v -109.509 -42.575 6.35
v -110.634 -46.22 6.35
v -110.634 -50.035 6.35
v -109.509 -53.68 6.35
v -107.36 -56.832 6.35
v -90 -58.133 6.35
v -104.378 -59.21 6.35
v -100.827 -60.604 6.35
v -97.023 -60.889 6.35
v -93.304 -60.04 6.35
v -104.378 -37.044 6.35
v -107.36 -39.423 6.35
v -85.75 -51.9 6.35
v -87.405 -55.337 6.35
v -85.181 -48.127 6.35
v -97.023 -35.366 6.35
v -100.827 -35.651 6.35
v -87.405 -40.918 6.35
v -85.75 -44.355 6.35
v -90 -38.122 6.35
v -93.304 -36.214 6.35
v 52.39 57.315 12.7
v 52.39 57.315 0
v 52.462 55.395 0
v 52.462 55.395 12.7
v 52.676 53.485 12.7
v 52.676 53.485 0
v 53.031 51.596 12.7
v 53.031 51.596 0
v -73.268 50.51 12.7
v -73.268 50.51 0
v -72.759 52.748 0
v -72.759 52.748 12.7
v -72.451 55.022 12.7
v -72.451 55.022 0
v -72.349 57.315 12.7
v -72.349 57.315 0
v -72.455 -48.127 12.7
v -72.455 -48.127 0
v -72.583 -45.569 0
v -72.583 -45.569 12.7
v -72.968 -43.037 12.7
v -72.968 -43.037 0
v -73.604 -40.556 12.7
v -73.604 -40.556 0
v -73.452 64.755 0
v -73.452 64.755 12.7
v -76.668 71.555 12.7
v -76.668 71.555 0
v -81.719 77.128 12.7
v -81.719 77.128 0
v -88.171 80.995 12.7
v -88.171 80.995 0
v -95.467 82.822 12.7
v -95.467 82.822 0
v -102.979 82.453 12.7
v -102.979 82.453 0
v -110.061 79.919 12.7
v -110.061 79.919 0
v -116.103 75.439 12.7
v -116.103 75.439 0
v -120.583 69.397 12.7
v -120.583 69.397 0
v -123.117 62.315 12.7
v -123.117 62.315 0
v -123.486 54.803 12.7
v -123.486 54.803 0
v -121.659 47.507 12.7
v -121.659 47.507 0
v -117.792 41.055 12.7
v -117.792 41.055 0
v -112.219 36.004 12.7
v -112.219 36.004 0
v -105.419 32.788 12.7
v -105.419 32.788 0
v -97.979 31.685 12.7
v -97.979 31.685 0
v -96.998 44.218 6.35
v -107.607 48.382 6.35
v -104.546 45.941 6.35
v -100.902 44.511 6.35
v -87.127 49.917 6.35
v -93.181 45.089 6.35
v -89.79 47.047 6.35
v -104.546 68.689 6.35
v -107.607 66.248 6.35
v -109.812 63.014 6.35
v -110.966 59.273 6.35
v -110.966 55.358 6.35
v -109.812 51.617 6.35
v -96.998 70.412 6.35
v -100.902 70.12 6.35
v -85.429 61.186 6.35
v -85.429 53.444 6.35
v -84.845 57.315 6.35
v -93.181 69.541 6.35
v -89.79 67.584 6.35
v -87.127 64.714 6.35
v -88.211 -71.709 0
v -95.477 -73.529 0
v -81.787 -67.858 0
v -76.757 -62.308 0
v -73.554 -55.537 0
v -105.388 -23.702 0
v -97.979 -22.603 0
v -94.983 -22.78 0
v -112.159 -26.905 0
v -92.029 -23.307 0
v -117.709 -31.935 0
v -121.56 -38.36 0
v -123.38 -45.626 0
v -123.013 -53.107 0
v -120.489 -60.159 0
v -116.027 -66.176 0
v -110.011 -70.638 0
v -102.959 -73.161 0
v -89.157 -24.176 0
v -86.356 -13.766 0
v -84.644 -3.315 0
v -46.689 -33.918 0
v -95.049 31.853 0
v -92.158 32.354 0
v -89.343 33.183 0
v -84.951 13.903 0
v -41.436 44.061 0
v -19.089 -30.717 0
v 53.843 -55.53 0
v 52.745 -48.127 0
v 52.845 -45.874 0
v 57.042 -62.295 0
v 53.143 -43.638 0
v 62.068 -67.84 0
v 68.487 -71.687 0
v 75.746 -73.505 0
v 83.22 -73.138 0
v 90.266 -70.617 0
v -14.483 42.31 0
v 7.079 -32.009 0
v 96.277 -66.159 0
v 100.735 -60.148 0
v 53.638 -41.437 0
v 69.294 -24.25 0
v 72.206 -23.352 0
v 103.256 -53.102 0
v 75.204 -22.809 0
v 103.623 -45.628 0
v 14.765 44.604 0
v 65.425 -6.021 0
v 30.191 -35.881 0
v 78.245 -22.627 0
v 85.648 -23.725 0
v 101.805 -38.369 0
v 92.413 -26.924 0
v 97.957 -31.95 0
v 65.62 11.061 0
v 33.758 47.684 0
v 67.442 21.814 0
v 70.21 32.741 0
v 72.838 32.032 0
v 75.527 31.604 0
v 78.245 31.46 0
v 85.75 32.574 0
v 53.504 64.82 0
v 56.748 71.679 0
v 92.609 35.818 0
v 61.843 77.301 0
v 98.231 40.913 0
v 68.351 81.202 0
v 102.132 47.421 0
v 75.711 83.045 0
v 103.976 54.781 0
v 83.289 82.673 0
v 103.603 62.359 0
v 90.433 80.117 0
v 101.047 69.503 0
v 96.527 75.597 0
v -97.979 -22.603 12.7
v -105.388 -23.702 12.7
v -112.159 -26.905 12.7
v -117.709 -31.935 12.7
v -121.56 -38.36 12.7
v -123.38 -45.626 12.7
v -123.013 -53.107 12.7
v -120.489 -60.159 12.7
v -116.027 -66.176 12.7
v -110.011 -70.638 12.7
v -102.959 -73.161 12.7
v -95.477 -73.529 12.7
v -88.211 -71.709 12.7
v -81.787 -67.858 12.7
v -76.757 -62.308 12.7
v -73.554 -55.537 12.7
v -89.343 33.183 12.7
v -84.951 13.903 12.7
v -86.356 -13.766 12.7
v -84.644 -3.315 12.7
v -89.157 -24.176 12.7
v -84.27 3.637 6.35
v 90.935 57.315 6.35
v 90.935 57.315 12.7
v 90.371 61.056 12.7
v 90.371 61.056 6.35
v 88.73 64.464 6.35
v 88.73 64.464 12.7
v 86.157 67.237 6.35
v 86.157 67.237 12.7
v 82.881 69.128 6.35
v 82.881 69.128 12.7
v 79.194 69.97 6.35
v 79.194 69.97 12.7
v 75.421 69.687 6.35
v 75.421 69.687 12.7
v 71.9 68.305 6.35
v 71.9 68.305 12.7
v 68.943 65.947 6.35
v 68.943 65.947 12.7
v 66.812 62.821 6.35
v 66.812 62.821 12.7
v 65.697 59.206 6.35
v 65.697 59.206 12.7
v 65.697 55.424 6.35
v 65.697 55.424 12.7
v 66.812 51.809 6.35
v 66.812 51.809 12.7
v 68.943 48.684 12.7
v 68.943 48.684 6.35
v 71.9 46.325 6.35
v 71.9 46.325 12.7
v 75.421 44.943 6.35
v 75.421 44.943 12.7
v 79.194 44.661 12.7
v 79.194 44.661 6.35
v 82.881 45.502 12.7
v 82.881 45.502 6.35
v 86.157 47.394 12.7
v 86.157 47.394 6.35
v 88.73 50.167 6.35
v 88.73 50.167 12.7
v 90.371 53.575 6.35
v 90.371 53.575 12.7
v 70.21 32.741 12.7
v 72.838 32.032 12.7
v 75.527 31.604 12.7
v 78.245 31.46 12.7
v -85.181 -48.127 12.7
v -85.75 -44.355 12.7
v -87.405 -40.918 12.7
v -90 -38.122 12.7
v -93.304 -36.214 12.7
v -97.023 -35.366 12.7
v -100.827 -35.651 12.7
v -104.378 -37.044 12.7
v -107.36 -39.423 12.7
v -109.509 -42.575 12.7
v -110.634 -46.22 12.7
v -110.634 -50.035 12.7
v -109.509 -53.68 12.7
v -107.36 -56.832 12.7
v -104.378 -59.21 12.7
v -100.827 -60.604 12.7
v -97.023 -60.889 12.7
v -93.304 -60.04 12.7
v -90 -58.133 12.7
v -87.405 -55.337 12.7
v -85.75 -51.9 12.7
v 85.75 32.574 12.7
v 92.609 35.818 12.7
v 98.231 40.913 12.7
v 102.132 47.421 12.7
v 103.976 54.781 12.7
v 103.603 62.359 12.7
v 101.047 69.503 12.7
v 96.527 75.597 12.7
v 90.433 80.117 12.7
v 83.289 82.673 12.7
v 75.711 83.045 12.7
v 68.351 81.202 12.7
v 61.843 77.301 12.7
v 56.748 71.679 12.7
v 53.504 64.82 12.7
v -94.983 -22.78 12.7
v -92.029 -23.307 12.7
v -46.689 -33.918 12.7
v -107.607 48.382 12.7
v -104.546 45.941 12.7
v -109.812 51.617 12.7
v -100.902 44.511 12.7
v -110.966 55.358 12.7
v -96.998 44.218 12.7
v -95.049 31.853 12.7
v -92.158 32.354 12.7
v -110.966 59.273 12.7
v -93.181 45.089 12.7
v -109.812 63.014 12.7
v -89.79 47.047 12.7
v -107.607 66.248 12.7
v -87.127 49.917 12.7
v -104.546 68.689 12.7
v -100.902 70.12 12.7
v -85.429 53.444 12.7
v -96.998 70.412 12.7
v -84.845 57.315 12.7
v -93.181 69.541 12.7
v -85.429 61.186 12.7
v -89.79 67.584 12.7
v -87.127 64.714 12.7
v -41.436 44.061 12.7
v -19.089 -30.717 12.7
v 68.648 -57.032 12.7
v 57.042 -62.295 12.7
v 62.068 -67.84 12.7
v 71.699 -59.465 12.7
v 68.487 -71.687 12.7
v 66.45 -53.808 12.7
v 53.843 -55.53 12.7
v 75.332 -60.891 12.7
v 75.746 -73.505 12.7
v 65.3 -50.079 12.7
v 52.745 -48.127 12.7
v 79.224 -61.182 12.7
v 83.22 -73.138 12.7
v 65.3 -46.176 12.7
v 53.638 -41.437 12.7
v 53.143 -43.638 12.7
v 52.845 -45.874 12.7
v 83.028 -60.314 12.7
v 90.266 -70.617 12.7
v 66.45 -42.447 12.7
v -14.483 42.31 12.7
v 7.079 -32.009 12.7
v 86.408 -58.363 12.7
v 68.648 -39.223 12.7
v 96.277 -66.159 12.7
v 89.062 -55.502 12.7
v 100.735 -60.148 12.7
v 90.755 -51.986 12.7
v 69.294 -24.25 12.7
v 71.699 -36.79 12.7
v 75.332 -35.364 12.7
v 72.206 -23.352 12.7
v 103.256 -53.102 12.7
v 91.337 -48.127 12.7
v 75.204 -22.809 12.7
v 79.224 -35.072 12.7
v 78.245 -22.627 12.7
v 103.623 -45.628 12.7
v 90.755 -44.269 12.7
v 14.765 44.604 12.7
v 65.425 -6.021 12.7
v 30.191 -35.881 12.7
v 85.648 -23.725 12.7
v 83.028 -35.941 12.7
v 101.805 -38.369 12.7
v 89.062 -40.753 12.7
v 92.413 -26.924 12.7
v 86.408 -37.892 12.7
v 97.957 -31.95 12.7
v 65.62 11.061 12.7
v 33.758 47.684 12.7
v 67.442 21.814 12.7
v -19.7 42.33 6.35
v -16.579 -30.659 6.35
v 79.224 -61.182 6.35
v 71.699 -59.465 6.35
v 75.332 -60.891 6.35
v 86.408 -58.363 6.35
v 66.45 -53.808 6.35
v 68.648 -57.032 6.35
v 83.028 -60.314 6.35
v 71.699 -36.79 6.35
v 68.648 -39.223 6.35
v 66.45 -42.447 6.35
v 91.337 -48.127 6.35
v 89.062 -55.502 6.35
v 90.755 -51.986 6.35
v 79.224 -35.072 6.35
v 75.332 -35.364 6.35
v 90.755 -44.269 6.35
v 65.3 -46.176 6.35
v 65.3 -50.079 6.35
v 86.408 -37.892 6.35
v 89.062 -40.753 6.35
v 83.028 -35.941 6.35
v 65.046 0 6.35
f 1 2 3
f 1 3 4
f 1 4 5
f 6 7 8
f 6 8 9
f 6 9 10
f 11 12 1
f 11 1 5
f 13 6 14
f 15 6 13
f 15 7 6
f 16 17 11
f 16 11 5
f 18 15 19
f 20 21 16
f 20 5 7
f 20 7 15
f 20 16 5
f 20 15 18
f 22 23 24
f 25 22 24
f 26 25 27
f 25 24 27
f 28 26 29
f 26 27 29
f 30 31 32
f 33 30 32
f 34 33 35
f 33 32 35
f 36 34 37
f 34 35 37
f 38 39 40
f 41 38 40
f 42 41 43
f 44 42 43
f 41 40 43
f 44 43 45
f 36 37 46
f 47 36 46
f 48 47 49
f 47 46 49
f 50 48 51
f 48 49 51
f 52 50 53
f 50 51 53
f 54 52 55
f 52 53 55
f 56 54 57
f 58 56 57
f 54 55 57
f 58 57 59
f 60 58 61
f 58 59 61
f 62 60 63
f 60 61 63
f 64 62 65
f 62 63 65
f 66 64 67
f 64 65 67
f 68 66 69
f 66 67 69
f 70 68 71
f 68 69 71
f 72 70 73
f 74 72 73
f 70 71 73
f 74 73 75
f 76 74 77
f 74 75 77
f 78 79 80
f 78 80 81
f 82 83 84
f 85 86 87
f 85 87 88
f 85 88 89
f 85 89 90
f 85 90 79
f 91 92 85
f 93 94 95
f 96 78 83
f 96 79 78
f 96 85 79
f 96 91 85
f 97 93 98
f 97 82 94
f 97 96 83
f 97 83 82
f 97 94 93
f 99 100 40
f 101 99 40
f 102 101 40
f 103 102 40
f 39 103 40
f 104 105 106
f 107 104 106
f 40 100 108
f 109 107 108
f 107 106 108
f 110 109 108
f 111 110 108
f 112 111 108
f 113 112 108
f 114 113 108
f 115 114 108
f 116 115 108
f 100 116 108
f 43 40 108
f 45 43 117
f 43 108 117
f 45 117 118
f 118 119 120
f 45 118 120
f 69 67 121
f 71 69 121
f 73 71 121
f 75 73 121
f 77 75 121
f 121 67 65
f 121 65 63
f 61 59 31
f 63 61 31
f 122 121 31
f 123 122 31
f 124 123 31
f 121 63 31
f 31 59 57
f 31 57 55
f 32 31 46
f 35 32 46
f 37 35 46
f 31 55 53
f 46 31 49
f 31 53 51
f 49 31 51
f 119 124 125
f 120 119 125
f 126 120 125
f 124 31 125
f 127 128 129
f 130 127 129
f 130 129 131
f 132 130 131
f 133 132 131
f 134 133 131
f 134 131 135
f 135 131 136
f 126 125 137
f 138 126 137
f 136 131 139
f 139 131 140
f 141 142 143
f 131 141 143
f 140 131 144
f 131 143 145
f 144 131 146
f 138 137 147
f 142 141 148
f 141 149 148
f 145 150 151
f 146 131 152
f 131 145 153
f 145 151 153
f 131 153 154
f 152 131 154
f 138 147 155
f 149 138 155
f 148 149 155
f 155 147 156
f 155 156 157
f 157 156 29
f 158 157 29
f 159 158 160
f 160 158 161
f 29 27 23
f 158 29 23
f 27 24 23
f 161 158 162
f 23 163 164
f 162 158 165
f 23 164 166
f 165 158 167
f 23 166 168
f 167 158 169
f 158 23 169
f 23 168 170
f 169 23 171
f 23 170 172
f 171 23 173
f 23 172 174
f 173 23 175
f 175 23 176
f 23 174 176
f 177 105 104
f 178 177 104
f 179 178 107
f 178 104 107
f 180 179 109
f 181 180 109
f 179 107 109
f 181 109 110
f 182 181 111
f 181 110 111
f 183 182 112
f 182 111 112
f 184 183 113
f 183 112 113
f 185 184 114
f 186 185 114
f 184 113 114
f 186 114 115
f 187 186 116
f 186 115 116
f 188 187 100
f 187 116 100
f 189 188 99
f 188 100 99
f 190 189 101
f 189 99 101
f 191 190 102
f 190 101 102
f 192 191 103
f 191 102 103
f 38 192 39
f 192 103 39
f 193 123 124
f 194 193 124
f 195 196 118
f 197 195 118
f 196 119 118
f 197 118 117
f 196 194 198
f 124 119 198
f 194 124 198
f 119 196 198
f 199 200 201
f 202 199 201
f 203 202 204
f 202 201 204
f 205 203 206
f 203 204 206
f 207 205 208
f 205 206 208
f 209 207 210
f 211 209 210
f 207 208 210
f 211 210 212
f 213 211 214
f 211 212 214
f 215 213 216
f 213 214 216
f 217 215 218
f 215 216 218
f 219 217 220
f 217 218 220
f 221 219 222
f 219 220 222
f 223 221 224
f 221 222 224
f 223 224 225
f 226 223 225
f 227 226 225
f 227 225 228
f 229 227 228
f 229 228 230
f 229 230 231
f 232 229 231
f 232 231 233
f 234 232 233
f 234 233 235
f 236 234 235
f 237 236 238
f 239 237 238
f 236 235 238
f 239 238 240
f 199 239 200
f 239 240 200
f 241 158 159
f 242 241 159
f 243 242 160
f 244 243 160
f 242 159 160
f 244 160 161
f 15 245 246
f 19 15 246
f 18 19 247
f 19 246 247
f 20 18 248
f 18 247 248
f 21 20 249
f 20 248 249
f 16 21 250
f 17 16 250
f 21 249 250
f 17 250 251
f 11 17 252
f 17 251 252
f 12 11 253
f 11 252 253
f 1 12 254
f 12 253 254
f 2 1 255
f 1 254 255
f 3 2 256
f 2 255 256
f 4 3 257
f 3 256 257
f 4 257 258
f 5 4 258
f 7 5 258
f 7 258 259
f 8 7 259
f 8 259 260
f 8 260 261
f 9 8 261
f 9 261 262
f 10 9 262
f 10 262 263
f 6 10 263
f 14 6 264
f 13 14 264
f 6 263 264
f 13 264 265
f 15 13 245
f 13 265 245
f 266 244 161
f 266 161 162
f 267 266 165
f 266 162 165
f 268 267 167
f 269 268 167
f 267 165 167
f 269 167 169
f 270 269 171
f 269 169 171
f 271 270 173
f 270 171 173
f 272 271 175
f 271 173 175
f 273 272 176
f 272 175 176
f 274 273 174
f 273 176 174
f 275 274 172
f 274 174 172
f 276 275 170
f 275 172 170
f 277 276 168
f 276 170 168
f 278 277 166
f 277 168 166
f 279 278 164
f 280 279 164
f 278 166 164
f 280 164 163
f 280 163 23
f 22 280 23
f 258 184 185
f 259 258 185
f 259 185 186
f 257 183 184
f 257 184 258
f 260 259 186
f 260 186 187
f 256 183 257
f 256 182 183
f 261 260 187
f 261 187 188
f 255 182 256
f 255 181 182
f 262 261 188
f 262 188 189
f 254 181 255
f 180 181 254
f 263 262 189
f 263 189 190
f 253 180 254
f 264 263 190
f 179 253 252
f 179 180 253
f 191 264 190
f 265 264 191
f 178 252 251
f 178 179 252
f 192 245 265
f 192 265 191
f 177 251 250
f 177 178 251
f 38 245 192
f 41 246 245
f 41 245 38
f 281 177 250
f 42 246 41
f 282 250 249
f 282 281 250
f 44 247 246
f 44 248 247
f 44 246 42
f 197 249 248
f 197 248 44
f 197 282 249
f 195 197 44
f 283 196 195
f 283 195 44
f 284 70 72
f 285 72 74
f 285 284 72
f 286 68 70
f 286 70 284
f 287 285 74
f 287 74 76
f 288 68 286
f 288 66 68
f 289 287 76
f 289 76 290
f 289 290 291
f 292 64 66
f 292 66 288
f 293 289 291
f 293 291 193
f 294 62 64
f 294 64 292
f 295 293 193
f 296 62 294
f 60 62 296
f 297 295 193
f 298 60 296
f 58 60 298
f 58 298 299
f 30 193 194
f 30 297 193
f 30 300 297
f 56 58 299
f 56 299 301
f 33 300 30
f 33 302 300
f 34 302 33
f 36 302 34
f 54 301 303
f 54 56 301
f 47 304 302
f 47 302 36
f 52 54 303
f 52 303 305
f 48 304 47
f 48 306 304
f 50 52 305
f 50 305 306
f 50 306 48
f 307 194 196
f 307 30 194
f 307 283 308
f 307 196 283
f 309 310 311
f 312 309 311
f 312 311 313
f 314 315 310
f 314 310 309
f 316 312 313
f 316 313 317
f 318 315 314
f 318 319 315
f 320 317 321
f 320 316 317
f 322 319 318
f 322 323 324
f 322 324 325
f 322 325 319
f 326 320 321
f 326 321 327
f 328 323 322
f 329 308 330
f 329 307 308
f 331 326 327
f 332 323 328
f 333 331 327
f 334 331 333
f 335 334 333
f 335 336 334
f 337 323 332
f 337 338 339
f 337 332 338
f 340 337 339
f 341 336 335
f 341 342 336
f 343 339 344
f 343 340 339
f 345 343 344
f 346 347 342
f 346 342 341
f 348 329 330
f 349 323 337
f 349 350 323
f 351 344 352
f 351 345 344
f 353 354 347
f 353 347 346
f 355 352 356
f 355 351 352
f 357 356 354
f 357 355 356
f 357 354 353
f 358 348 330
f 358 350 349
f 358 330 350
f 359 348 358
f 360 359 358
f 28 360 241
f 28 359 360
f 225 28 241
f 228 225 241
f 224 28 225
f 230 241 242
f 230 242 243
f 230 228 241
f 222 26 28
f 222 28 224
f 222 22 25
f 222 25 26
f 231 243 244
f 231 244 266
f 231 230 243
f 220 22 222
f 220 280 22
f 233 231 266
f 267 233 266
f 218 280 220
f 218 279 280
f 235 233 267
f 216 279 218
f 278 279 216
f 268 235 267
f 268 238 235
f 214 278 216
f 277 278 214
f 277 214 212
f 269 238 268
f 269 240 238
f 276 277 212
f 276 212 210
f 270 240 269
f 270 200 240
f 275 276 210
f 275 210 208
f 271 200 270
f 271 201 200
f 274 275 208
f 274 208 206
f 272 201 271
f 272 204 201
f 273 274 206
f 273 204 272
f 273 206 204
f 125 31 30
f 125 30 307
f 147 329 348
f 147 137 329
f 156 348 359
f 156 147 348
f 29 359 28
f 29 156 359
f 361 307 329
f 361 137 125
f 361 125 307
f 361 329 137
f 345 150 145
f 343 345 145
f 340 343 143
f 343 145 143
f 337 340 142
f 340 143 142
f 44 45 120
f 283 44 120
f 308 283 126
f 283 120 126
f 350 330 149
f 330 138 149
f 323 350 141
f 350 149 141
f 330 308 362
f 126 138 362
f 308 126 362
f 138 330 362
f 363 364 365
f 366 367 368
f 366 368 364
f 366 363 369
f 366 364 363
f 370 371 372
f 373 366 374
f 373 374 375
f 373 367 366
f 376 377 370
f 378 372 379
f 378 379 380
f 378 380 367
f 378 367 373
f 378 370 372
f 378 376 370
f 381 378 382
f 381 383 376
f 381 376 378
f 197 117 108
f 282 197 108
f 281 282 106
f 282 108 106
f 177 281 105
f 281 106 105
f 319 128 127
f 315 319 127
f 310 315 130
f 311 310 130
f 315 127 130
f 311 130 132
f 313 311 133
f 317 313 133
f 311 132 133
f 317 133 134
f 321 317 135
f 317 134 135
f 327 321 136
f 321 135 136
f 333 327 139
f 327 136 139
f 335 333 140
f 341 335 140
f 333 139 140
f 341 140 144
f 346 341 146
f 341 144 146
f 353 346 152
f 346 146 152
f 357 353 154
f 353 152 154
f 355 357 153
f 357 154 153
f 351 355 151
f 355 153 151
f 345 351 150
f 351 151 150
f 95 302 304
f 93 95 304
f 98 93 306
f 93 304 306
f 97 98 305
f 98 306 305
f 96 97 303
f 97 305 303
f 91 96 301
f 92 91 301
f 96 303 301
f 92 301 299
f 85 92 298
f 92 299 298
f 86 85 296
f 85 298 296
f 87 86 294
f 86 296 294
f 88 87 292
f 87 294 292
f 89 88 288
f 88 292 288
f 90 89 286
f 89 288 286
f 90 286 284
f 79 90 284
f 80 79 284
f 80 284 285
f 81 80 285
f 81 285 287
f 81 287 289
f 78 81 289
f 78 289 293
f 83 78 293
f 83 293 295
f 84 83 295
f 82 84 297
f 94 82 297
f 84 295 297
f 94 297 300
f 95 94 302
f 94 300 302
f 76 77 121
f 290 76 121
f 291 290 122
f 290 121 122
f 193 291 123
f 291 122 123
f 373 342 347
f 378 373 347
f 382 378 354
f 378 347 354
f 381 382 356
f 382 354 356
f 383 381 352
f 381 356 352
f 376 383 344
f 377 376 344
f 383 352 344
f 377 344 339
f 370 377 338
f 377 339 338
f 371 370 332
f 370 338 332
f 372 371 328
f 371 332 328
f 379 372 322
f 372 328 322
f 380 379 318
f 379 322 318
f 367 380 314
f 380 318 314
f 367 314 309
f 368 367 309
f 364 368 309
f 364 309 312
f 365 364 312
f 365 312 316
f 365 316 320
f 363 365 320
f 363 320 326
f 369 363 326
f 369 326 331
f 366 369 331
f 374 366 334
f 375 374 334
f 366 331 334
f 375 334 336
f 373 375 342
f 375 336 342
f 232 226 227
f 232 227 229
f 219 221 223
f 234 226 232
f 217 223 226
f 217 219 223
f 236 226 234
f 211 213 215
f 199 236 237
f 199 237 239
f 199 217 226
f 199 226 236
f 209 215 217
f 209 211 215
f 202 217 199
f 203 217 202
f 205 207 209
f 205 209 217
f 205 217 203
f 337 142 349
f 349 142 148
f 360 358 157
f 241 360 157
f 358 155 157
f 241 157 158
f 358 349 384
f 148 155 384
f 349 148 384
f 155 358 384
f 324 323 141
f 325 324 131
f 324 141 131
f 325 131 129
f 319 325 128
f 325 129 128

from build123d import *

# Parameters (mm, degrees)
F1_DEPTH = 12.7
F2_R     = 12.6899466908
F3_DEPTH = 6.35
F4_R     = 13.0916621451
F5_DEPTH = 6.35
F6_R     = 13.1338166207
F7_DEPTH = 6.35
F8_R     = 12.797635225
F9_DEPTH = 6.35


with BuildPart() as f1:
    # F0 (on Top) → F1 (new body)
    with BuildSketch(Plane.XY):
        with BuildLine():
            add(Edge.make_bspline(
                [(-97.9790315032, 57.3151484132), (-94.8917277119, 49.2634504814), (-91.8044239206, 41.2117525495), (-89.3433409519, 33.1833022823)],
                knots=[0, 0, 0, 0, 0.2258221369, 0.2258221369, 0.2258221369, 0.2258221369], degree=3))
            ThreePointArc((-89.3433409519, 33.1833022823), (-79.1894484696, 39.8832030713), (-73.2684448417, 50.5101461484))
            add(Edge.make_bspline(
                [(-97.9790315032, 57.3151484132), (-89.7678150487, 54.9705923246), (-81.5565985942, 52.6260362361), (-73.2684448417, 50.5101461484)],
                knots=[0, 0, 0, 0, 0.1532150424, 0.1532150424, 0.1532150424, 0.1532150424], degree=3))
        make_face()
        with BuildLine():
            Line((-72.348558449, 57.3151484132), (-97.9790315032, 57.3151484132))
            add(Edge.make_bspline(
                [(-97.9790315032, 57.3151484132), (-89.7678150487, 54.9705923246), (-81.5565985942, 52.6260362361), (-73.2684448417, 50.5101461484)],
                knots=[0, 0, 0, 0, 0.1532150424, 0.1532150424, 0.1532150424, 0.1532150424], degree=3))
            ThreePointArc((-73.2684448417, 50.5101461484), (-72.5795711294, 53.8817009183), (-72.348558449, 57.3151484132))
        make_face()
        with BuildLine():
            Line((-97.9790315032, 57.3151484132), (-97.9790315032, 31.684675359))
            ThreePointArc((-97.9790315032, 31.684675359), (-93.5966510441, 32.0621111604), (-89.3433409519, 33.1833022823))
            add(Edge.make_bspline(
                [(-97.9790315032, 57.3151484132), (-94.8917277119, 49.2634504814), (-91.8044239206, 41.2117525495), (-89.3433409519, 33.1833022823)],
                knots=[0, 0, 0, 0, 0.2258221369, 0.2258221369, 0.2258221369, 0.2258221369], degree=3))
        make_face()
        with BuildLine():
            ThreePointArc((-72.348558449, 57.3151484132), (-116.1025128048, 75.4386297148), (-97.9790315032, 31.684675359))
            Line((-97.9790315032, 31.684675359), (-97.9790315032, 57.3151484132))
            Line((-97.9790315032, 57.3151484132), (-72.348558449, 57.3151484132))
        make_face()
        with BuildLine():
            Line((-97.9790315032, -22.6032967451), (-97.9790315032, -48.1273792684))
            add(Edge.make_bspline(
                [(-89.1568913198, -24.1764162139), (-91.6474722391, -32.1767811704), (-94.8132518711, -40.1520802194), (-97.9790315032, -48.1273792684)],
                knots=[0.7697468516, 0.7697468516, 0.7697468516, 0.7697468516, 1, 1, 1, 1], degree=3))
            ThreePointArc((-89.1568913198, -24.1764162139), (-93.4983824911, -22.9996540812), (-97.9790315032, -22.6032967451))
        make_face()
        with BuildLine():
            add(Edge.make_bspline(
                [(-97.9790315032, -48.1273792684), (-89.8692523818, -45.5267859125), (-81.7594732605, -42.9261925567), (-73.6038589741, -40.5557379118)],
                knots=[0, 0, 0, 0, 0.1468762855, 0.1468762855, 0.1468762855, 0.1468762855], degree=3))
            Line((-97.9790315032, -48.1273792684), (-72.4549489799, -48.1273792684))
            ThreePointArc((-72.4549489799, -48.1273792684), (-72.7438110385, -44.2982231274), (-73.6038589741, -40.5557379118))
        make_face()
        with BuildLine():
            add(Edge.make_bspline(
                [(-89.1568913198, -24.1764162139), (-91.6474722391, -32.1767811704), (-94.8132518711, -40.1520802194), (-97.9790315032, -48.1273792684)],
                knots=[0.7697468516, 0.7697468516, 0.7697468516, 0.7697468516, 1, 1, 1, 1], degree=3))
            add(Edge.make_bspline(
                [(-97.9790315032, -48.1273792684), (-89.8692523818, -45.5267859125), (-81.7594732605, -42.9261925567), (-73.6038589741, -40.5557379118)],
                knots=[0, 0, 0, 0, 0.1468762855, 0.1468762855, 0.1468762855, 0.1468762855], degree=3))
            ThreePointArc((-73.6038589741, -40.5557379118), (-79.4699543341, -30.5520314482), (-89.1568913198, -24.1764162139))
        make_face()
        with BuildLine():
            Line((-72.4549489799, -48.1273792684), (-97.9790315032, -48.1273792684))
            Line((-97.9790315032, -48.1273792684), (-97.9790315032, -22.6032967451))
            ThreePointArc((-97.9790315032, -22.6032967451), (-116.027283339, -66.1756311042), (-72.4549489799, -48.1273792684))
        make_face()
        with BuildLine():
            ThreePointArc((69.2940983232, -24.2495217193), (59.3934172366, -30.9551926113), (53.638077891, -41.436870774))
            add(Edge.make_bspline(
                [(53.638077891, -41.436870774), (61.8198164822, -43.5633793037), (70.0325232507, -45.845379286), (78.2452300191, -48.1273792684)],
                knots=[0.8679259668, 0.8679259668, 0.8679259668, 0.8679259668, 1, 1, 1, 1], degree=3))
            add(Edge.make_bspline(
                [(78.2452300191, -48.1273792684), (75.0007191566, -40.2161005478), (71.7562082941, -32.3048218271), (69.2940983232, -24.2495217193)],
                knots=[0, 0, 0, 0, 0.2420801973, 0.2420801973, 0.2420801973, 0.2420801973], degree=3))
        make_face()
        with BuildLine():
            add(Edge.make_bspline(
                [(78.2452300191, -48.1273792684), (75.0007191566, -40.2161005478), (71.7562082941, -32.3048218271), (69.2940983232, -24.2495217193)],
                knots=[0, 0, 0, 0, 0.2420801973, 0.2420801973, 0.2420801973, 0.2420801973], degree=3))
            Line((78.2452300191, -48.1273792684), (78.2452300191, -22.6268922187))
            ThreePointArc((78.2452300191, -22.6268922187), (73.6967224305, -23.0358285294), (69.2940983232, -24.2495217193))
        make_face()
        with BuildLine():
            ThreePointArc((53.638077891, -41.436870774), (52.9690633404, -44.752436632), (52.7447429694, -48.1273792684))
            Line((52.7447429694, -48.1273792684), (78.2452300191, -48.1273792684))
            add(Edge.make_bspline(
                [(53.638077891, -41.436870774), (61.8198164822, -43.5633793037), (70.0325232507, -45.845379286), (78.2452300191, -48.1273792684)],
                knots=[0.8679259668, 0.8679259668, 0.8679259668, 0.8679259668, 1, 1, 1, 1], degree=3))
        make_face()
        with BuildLine():
            Line((78.2452300191, -48.1273792684), (52.7447429694, -48.1273792684))
            ThreePointArc((52.7447429694, -48.1273792684), (78.2452300191, -73.6278663181), (103.7457170688, -48.1273792684))
            ThreePointArc((103.7457170688, -48.1273792684), (96.2767973355, -30.095811952), (78.2452300191, -22.6268922187))
            Line((78.2452300191, -22.6268922187), (78.2452300191, -48.1273792684))
        make_face()
        with BuildLine():
            add(Edge.make_bspline(
                [(70.2099663174, 32.740651796), (72.5324991188, 40.8666400762), (75.388864569, 49.0908942447), (78.2452300191, 57.3151484132)],
                knots=[0.7809669753, 0.7809669753, 0.7809669753, 0.7809669753, 1, 1, 1, 1], degree=3))
            ThreePointArc((70.2099663174, 32.740651796), (74.1769173352, 31.782420814), (78.2452300191, 31.4603355779))
            Line((78.2452300191, 31.4603355779), (78.2452300191, 57.3151484132))
        make_face()
        with BuildLine():
            add(Edge.make_bspline(
                [(53.0309728344, 51.5956570573), (61.4062012949, 53.4144058383), (69.825715657, 55.3647771258), (78.2452300191, 57.3151484132)],
                knots=[0.8678396009, 0.8678396009, 0.8678396009, 0.8678396009, 1, 1, 1, 1], degree=3))
            ThreePointArc((53.0309728344, 51.5956570573), (59.1334413627, 39.9021968799), (70.2099663174, 32.740651796))
            add(Edge.make_bspline(
                [(70.2099663174, 32.740651796), (72.5324991188, 40.8666400762), (75.388864569, 49.0908942447), (78.2452300191, 57.3151484132)],
                knots=[0.7809669753, 0.7809669753, 0.7809669753, 0.7809669753, 1, 1, 1, 1], degree=3))
        make_face()
        with BuildLine():
            Line((78.2452300191, 57.3151484132), (52.3904171839, 57.3151484132))
            ThreePointArc((52.3904171839, 57.3151484132), (52.5510551244, 54.4375238324), (53.0309728344, 51.5956570573))
            add(Edge.make_bspline(
                [(53.0309728344, 51.5956570573), (61.4062012949, 53.4144058383), (69.825715657, 55.3647771258), (78.2452300191, 57.3151484132)],
                knots=[0.8678396009, 0.8678396009, 0.8678396009, 0.8678396009, 1, 1, 1, 1], degree=3))
        make_face()
        with BuildLine():
            ThreePointArc((104.1000428543, 57.3151484132), (78.2452300191, 83.1699612484), (52.3904171839, 57.3151484132))
            Line((52.3904171839, 57.3151484132), (78.2452300191, 57.3151484132))
            Line((78.2452300191, 57.3151484132), (78.2452300191, 31.4603355779))
            ThreePointArc((78.2452300191, 31.4603355779), (96.5273435012, 39.0330349311), (104.1000428543, 57.3151484132))
        make_face()
        with BuildLine():
            add(Edge.make_bspline(
                [(-89.3433409519, 33.1833022823), (-86.3089203393, 23.2845319899), (-82.2407796779, 4.0159084283), (-86.2851127622, -14.9515496945), (-89.1568913198, -24.1764162139)],
                knots=[0.2258221369, 0.2258221369, 0.2258221369, 0.2258221369, 0.5042521434, 0.7697468516, 0.7697468516, 0.7697468516, 0.7697468516], degree=3))
            ThreePointArc((-89.1568913198, -24.1764162139), (-79.4699543341, -30.5520314482), (-73.6038589741, -40.5557379118))
            add(Edge.make_bspline(
                [(-73.6038589741, -40.5557379118), (-55.0144907829, -35.1526802602), (-14.4638072494, -26.0907707686), (29.7094018219, -35.2175894809), (53.638077891, -41.436870774)],
                knots=[0.1468762855, 0.1468762855, 0.1468762855, 0.1468762855, 0.4816563834, 0.8679259668, 0.8679259668, 0.8679259668, 0.8679259668], degree=3))
            ThreePointArc((53.638077891, -41.436870774), (59.3934172366, -30.9551926113), (69.2940983232, -24.2495217193))
            add(Edge.make_bspline(
                [(69.2940983232, -24.2495217193), (66.8796393942, -16.350121814), (63.1067862028, 1.895913691), (67.0130764735, 21.5554967842), (70.2099663174, 32.740651796)],
                knots=[0.2420801973, 0.2420801973, 0.2420801973, 0.2420801973, 0.4794752368, 0.7809669753, 0.7809669753, 0.7809669753, 0.7809669753], degree=3))
            ThreePointArc((70.2099663174, 32.740651796), (59.1334413627, 39.9021968799), (53.0309728344, 51.5956570573))
            add(Edge.make_bspline(
                [(-73.2684448417, 50.5101461484), (-55.9796971344, 46.0964864848), (-16.5735995756, 38.4523299071), (27.9976145113, 46.1594602838), (53.0309728344, 51.5956570573)],
                knots=[0.1532150424, 0.1532150424, 0.1532150424, 0.1532150424, 0.4728153168, 0.8678396009, 0.8678396009, 0.8678396009, 0.8678396009], degree=3))
            ThreePointArc((-73.2684448417, 50.5101461484), (-79.1894484696, 39.8832030713), (-89.3433409519, 33.1833022823))
        make_face()
    extrude(amount=F1_DEPTH)

    # F2 (on face) → F3 (cut)
    with BuildSketch(Plane.XY.offset(12.7)):
        with Locations((78.2452300191, 57.3151484132)):
            Circle(F2_R)
    extrude(amount=-F3_DEPTH, mode=Mode.SUBTRACT)

    # F4 (on face) → F5 (cut)
    with BuildSketch(Plane.XY.offset(12.7)):
        with Locations((78.2452300191, -48.1273792684)):
            Circle(F4_R)
    extrude(amount=-F5_DEPTH, mode=Mode.SUBTRACT)

    # F6 (on face) → F7 (cut)
    with BuildSketch(Plane.XY.offset(12.7)):
        with Locations((-97.9790315032, 57.3151484132)):
            Circle(F6_R)
    extrude(amount=-F7_DEPTH, mode=Mode.SUBTRACT)

    # F8 (on face) → F9 (cut)
    with BuildSketch(Plane.XY.offset(12.7)):
        with Locations((-97.9790315032, -48.1273792684)):
            Circle(F8_R)
    extrude(amount=-F9_DEPTH, mode=Mode.SUBTRACT)


solid = f1.part
